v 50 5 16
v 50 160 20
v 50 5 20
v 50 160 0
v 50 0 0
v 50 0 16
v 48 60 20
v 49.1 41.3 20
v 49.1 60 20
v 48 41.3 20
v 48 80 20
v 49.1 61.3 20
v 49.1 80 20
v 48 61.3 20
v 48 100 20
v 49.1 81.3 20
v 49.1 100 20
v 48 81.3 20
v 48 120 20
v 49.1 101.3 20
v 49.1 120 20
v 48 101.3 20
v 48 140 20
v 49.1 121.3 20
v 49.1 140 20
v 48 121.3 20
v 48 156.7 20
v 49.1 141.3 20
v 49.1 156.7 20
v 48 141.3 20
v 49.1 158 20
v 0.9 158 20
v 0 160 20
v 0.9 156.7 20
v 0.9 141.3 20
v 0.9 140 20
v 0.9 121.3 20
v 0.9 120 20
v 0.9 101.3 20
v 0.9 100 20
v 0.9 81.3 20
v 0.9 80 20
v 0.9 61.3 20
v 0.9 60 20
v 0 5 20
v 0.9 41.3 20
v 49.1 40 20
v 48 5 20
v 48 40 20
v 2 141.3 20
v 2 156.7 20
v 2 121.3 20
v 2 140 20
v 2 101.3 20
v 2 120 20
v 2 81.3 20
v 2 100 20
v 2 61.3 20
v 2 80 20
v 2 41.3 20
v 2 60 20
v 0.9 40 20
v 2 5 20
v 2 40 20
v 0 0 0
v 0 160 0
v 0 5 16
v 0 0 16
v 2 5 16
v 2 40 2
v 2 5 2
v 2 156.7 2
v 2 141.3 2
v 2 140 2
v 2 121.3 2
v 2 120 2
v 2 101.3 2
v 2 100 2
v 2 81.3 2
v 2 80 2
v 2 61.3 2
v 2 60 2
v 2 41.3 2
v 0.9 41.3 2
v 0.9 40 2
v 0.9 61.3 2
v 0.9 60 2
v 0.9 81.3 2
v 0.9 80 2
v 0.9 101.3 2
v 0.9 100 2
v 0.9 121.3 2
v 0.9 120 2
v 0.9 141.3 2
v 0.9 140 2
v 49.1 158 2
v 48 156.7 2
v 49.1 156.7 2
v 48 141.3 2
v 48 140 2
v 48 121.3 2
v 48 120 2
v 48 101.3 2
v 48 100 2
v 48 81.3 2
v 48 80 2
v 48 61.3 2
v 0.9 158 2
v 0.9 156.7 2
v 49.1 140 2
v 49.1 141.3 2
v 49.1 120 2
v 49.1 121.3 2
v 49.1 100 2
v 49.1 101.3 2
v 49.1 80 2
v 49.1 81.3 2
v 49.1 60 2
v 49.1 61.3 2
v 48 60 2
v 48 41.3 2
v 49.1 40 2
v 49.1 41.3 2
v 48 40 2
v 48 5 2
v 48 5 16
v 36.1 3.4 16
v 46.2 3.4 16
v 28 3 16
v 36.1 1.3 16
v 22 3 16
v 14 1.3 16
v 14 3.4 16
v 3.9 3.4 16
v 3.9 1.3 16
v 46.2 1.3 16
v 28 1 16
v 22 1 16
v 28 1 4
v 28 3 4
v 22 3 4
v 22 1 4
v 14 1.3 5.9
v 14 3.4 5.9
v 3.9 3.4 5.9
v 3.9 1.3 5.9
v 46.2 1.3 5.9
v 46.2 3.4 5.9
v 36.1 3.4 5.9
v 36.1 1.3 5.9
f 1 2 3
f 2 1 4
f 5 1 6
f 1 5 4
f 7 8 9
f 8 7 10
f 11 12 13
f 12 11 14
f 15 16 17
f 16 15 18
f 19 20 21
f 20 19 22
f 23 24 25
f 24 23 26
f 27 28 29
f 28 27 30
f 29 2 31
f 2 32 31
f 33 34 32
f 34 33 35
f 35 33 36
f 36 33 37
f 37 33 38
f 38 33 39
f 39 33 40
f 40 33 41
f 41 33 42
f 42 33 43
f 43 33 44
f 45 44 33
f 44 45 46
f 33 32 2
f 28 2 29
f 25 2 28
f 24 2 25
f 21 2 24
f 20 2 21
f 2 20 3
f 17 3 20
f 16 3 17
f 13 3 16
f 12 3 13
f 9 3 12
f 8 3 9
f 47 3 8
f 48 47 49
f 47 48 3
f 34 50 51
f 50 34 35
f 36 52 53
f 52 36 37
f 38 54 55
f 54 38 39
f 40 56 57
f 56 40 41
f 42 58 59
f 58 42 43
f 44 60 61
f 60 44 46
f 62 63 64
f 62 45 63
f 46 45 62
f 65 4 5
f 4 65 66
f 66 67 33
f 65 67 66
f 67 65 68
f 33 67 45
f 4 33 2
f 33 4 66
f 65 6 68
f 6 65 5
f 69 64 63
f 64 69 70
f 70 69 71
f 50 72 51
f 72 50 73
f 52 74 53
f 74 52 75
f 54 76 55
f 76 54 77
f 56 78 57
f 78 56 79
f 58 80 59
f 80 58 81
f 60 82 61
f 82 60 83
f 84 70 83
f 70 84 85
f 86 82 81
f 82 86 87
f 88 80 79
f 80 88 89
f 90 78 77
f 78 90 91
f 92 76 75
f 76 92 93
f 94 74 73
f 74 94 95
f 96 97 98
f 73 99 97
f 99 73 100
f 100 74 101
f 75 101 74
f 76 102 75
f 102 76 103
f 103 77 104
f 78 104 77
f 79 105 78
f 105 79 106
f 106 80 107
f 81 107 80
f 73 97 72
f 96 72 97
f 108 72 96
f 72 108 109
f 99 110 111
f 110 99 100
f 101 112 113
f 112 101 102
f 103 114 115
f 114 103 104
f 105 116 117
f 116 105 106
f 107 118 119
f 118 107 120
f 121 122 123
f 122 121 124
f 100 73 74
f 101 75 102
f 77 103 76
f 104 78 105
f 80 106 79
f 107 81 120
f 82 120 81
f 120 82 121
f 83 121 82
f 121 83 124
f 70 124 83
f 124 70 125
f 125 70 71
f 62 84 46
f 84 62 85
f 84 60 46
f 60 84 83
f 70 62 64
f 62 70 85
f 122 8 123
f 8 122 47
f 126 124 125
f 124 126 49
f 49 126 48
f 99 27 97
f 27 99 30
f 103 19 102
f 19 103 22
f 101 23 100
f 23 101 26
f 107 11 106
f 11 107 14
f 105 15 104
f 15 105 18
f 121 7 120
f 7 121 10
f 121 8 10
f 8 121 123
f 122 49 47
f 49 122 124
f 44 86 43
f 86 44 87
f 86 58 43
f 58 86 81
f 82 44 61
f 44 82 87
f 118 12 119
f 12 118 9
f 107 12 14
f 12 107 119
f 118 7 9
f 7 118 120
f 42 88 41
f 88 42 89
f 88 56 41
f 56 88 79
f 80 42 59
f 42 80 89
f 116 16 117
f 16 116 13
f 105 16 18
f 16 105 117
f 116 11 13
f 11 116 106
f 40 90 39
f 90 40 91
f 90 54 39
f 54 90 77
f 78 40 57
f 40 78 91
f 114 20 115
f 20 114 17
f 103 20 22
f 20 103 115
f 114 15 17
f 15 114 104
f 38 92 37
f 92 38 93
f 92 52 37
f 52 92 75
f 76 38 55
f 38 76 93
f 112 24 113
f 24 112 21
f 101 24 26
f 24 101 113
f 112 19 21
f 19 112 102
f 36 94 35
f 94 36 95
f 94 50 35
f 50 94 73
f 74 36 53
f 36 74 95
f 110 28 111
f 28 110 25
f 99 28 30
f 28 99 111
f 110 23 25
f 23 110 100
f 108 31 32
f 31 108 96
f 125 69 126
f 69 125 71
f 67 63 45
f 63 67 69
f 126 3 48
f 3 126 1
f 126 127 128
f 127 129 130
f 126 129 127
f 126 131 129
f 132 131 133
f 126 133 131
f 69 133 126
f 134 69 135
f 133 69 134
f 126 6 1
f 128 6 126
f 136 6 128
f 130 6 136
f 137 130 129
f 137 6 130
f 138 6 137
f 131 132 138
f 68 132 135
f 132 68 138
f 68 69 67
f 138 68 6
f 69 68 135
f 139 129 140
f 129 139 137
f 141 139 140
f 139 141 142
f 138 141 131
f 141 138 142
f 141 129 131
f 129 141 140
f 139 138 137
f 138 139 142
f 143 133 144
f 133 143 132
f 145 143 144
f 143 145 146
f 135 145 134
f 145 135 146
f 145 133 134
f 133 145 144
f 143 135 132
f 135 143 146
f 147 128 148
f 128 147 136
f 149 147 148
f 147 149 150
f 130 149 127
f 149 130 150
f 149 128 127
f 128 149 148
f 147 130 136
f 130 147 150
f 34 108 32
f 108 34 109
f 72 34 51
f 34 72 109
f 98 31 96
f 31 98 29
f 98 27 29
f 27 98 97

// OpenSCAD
/*******************************************************/
// 1  = drawer
// 2  = base
// 3  = exterior front support
// 4  = exterior middle support
// 5  = exterior back support
// 6  = interior front support
// 7  = interior middle support
// 8  = interior back support
// 9  = drawer label
// 10 = side
// 11 = back 
// 12 = divider
// value from 1 to 12. Change to make all the necessary models for the storage system
MODEL_TO_MAKE = 1;

// exterior depth of drawer
DRAWER_DEPTH           = 160; 
// exterior width of drawer
DRAWER_WIDTH           = 50;   
// exterior height of drawer front including label
DRAWER_FRONT_HEIGHT    = 80;  
// exterior height of drawer sides and back
DRAWER_SIDES_HEIGHT    = 20;  
// thickness of sides, back, and bottom of drawer
DRAWER_THICKNESS       = 2;
// thickness of front of drawer. Needs room for label tabs and magnet. Best not to edit
DRAWER_FRONT_THICKNESS = 5;
// will always add one to back, then at the depths below
DIVIDER_SLOTS = [40,60,80,100, 120, 140];

// thickness of the dividers that can be placed in the drawer, will add tolerance when created
DIVIDER_THICKNESS = 1.2;
// Extra space for divider to slide into slots in drawer
DIVIDER_TOLERANCE = 0.1;
// distance divider slot will extend into sides of drawer, will add tolerance when created
DIVIDER_DEPTH = 1;
// height of the divider
DIVIDER_HEIGHT = 50;

// extra space for the label to slide into the tabs in the front of drawer
LABEL_TAB_EXTRA_SPACE  = 0.1;

// multiplied by DRAWER_FRONT_HEIGHT to determine height of label
LABEL_AS_PCT_OF_DRAWER = 0.8;
// height of the tab that will slide into the front of drawer
LABEL_TAB_HEIGHT       = 10;
// thickness of tab that will slide into front of drawer
LABEL_TAB_THICKNESS    = 2;
// width of the tab that will slide into front of drawer
LABEL_TAB_WIDTH        = 10;
// distance from the side of the label to the start of the tab
LABEL_TAB_SIDE_OFFSET  = 4;
//distance from the front of the label to the start of the tab
LABEL_TAB_FRONT_OFFSET = 1.4;

// total distance between drawer and supports to its sides
DRAWER_HORIZONTAL_TOLERANCE = 1;
// total distance between drawer and the bases above and below
DRAWER_VERTICAL_TOLERANCE   = 1;
// total distance between drawer and front of base below/above and supports behind
DRAWER_DEPTH_TOLERANCE      = 1;

// thickness of the bases
BASE_HEIGHT             = 5; 
// thickness of base interior. Support holes will not penetrate this interior section
BASE_INTERIOR_HEIGHT    = 1;
// Number of bases a drawer will span over its depth. Should be at least 2. 
BASES_PER_DRAWER        = 2;
// Save some filament by removing an interior rectangle from the base
BASE_REMOVAL_PERCENTAGE = .60;

// Thickness of side and back plates that slide between supports. These parts are solely aesthetic. Value must be less than 3.
SIDE_BACK_THICKNESS = 1.2;

//Provide a way to pull the drawer. Value of 0, 1, 2, 3: 3 = protrusion  2= centered hole for a knob, 1= slot for a magnet, 0=none
PULL_TYPE = 1;

// if PULL_TYPE == 1, make a slot to fit a magnet with this width or diameter
MAGNET_WIDTH  = 6;
// if PULL_TYPE == 1, make a slot to fit a magnet with this thickness
MAGNET_HEIGHT = 2;
// if PULL_TYPE == 1, make a slot that extends down to this distance from bottom of drawer
MAGNET_HEIGHT_OFFSET = 4;

// if PULL_TYPE == 2, make a hole of this diameter
KNOB_HOLE_DIAMETER = 8;
// if PULL_TYPE == 2, the height of center of knob hole from bottom of  drawer
KNOB_HOLE_HEIGHT = 12;
// if PULL_TYPE == 2, add a square inside the drawer of this size
KNOB_SQUARE_SIZE = 10;
// if PULL_TYPE == 2, add a square inside the drawer of this depth
KNOB_SQUARE_DEPTH = 1.2;

// if PULL_TYPE == 3, width of drawer base protrusion
PROTRUSION_WIDTH = 20;
// if PULL_TYPE == 3, height of drawer base protrusion
PROTRUSION_HEIGHT = 6;
// if PULL_TYPE == 3, depth of drawer base protrusion
PROTRUSION_DEPTH = 4;
// if PULL_TYPE == 3, percent of protrusion hollowed out
PROTRUSION_HOLLOW_PCT = 0.6;
 

// List of text to engrave on the drawer label. Each element in list is a list of 4 values:  [text, size of text, font, distance from bottom of label to font base]
TEXTS = [
         ["MLB", 12, "Arial", 40], 
         ["1986", 8, "Arial", 14]
        ];
// Depth to engrave the text into the label.
TEXT_DEPTH = 0.6;


/***************************************************************/

//do not edit
SUPPORT_DEPTH = 9.8;
// do not edit
SUPPORT_WIDTH = 6;


// The set 2D profile for all supports
module profile()
{
    square([1.5,SUPPORT_DEPTH]);
    translate([1.5,0,0]) 
        square([3, 5.8]);
    translate([4.5,0,0]) 
        square([1.5,SUPPORT_DEPTH]);
}

module support_exterior_front(height)
{
    translate([1,1,0]) 
        cube([4,4,height+4]);
    translate([0,0,2]) 
        linear_extrude(height)
            profile();
    
}

module support_exterior_middle(height)
{
    support_exterior_front(height);
    rotate(180) 
        translate([-SUPPORT_WIDTH,0,0]) 
            support_exterior_front(height);
}

module support_interior_middle(height)
{
    support_exterior_middle(height);
    translate([SUPPORT_WIDTH,0,0]) 
        support_exterior_middle(height);
}

module support_interior_front(height)
{
    support_exterior_front(height);
    translate([SUPPORT_WIDTH,0,0]) 
        support_exterior_front(height);
}

module support_exterior_back(height)
{
   support_exterior_front(height);
   rotate(90)
        translate([0,-SUPPORT_WIDTH,0])
            support_exterior_front(height);
}

module support_interior_back(height)
{
    support_exterior_back(height);
    rotate(270)
        translate([-SUPPORT_WIDTH,SUPPORT_WIDTH,0])
            support_exterior_back(height);
}

// Base is two halves with holes and an interior.
module base_half(width, depth, height)
{
    
    difference(){
        cube([width, depth, height]);
        translate([1,1,0])
            cube([2,2,height]);
        translate([width-3,1,0])
            cube([2,2,height]);
        translate([width-3,depth-3,0])
            cube([2,2,height]);
        translate([1,depth-3,0])
            cube([2,2,height]);
    }    
}

module base(width, depth)
{
    h = (BASE_HEIGHT - BASE_INTERIOR_HEIGHT) / 2;
    base_half(width, depth, h);
    difference()
    {
        union(){
            translate([0, 0, h])
                cube([width,depth,BASE_INTERIOR_HEIGHT]); 
            translate([0,0,BASE_INTERIOR_HEIGHT + h])
                base_half(width,depth, h );
            
        }
        // remove a section of base to save filament
        translate([(width - width*BASE_REMOVAL_PERCENTAGE)/2,
                   (depth - depth*BASE_REMOVAL_PERCENTAGE) / 2,
                   0 ])
           cube([width*BASE_REMOVAL_PERCENTAGE,
                depth*BASE_REMOVAL_PERCENTAGE,
                10]);
    }
}

module drawer(width, depth, height, side_height, thickness, front_thickness)
{
    magnet_x = (width - MAGNET_WIDTH) / 2;
    label_z = height - (height*LABEL_AS_PCT_OF_DRAWER);
    
    difference(){
        union(){
            
            cube([width, depth, side_height]);
            cube([width, front_thickness, label_z]);
            
            // protrusion
            if (PULL_TYPE == 3)
            {
                translate([(width - PROTRUSION_WIDTH)/2, -PROTRUSION_DEPTH, 0])
                    cube([PROTRUSION_WIDTH, PROTRUSION_DEPTH, PROTRUSION_HEIGHT]);
            }
        }
        // hollow it out
        translate([thickness, front_thickness, thickness])
            cube([width - (2 * thickness), 
                  depth - thickness - front_thickness, 
                  side_height]);
        // remove excess from where label will go
        translate([0, 0, label_z])
            cube([width, front_thickness, height]);
        // magnet slot
        if (PULL_TYPE == 1)
            translate([magnet_x, 1, MAGNET_HEIGHT_OFFSET ])
                cube([MAGNET_WIDTH, MAGNET_HEIGHT, label_z]);
        // knob hole
        if (PULL_TYPE == 2)
        {
            translate([width/2, 0, KNOB_HOLE_HEIGHT])
                rotate([270,0,0])
                    cylinder(h=front_thickness+1, d=KNOB_HOLE_DIAMETER);
            translate([width/2, front_thickness - KNOB_SQUARE_DEPTH/2, KNOB_HOLE_HEIGHT])
                rotate([0,45,0])
                      cube([KNOB_SQUARE_SIZE, KNOB_SQUARE_DEPTH, KNOB_SQUARE_SIZE], true);
        }
        // protrusion
        if (PULL_TYPE == 3)
        {
            translate([(width - PROTRUSION_WIDTH*PROTRUSION_HOLLOW_PCT)/2, 
                        -PROTRUSION_DEPTH*PROTRUSION_HOLLOW_PCT, 
                        PROTRUSION_HEIGHT -PROTRUSION_HEIGHT*PROTRUSION_HOLLOW_PCT])
                cube([PROTRUSION_WIDTH*PROTRUSION_HOLLOW_PCT, 
                      PROTRUSION_DEPTH*PROTRUSION_HOLLOW_PCT, 
                      PROTRUSION_HEIGHT*PROTRUSION_HOLLOW_PCT]);
        }
        // label tab left slot
        translate([(LABEL_TAB_SIDE_OFFSET - LABEL_TAB_EXTRA_SPACE), 
                   (LABEL_TAB_FRONT_OFFSET - LABEL_TAB_EXTRA_SPACE), 
                   label_z - LABEL_TAB_HEIGHT - LABEL_TAB_EXTRA_SPACE])
            cube([LABEL_TAB_WIDTH + LABEL_TAB_EXTRA_SPACE, 
                  LABEL_TAB_THICKNESS + LABEL_TAB_EXTRA_SPACE, 
                  height]);
        //label tab right slot
        translate([width - LABEL_TAB_SIDE_OFFSET - LABEL_TAB_WIDTH + LABEL_TAB_EXTRA_SPACE, 
                   LABEL_TAB_FRONT_OFFSET - LABEL_TAB_EXTRA_SPACE, 
                   label_z - LABEL_TAB_HEIGHT - LABEL_TAB_EXTRA_SPACE])
            cube([LABEL_TAB_WIDTH + LABEL_TAB_EXTRA_SPACE, 
                  LABEL_TAB_THICKNESS + LABEL_TAB_EXTRA_SPACE, 
                  height]);
        // back divider slot left
        translate([thickness - DIVIDER_DEPTH - DIVIDER_TOLERANCE,
                   depth - thickness - DIVIDER_THICKNESS - DIVIDER_TOLERANCE, 
                   thickness])
            cube([DIVIDER_DEPTH + DIVIDER_TOLERANCE, 
                  DIVIDER_THICKNESS + DIVIDER_TOLERANCE, 
                  side_height]);
        // back divider slot right
        translate([width - thickness,
                   depth-thickness - DIVIDER_THICKNESS - DIVIDER_TOLERANCE, 
                   thickness])
            cube([DIVIDER_DEPTH + DIVIDER_TOLERANCE, 
                  DIVIDER_THICKNESS + DIVIDER_TOLERANCE, 
                  side_height]);               
        // other divider slots
        for (d = DIVIDER_SLOTS)
        {
            // left side
            translate([thickness - DIVIDER_DEPTH - DIVIDER_TOLERANCE, d, thickness])
                cube([DIVIDER_DEPTH + DIVIDER_TOLERANCE, 
                     DIVIDER_THICKNESS + DIVIDER_TOLERANCE, 
                     side_height]);
            // right side
            translate([width - thickness, d, thickness])
                cube([DIVIDER_DEPTH + DIVIDER_TOLERANCE, 
                     DIVIDER_THICKNESS + DIVIDER_TOLERANCE, 
                     side_height]); 
            
        }
        
        
    }
}

module drawer_label(width, thickness, height)
{
    
    difference(){
        union(){
            cube([width, height, thickness]);
            translate([LABEL_TAB_SIDE_OFFSET, -LABEL_TAB_HEIGHT, 0 ])
                cube([LABEL_TAB_WIDTH, LABEL_TAB_HEIGHT, LABEL_TAB_THICKNESS ]);
            translate([width - LABEL_TAB_SIDE_OFFSET - LABEL_TAB_WIDTH, 
                       -LABEL_TAB_HEIGHT, 0])
            cube([LABEL_TAB_WIDTH, LABEL_TAB_HEIGHT, LABEL_TAB_THICKNESS ]);
        }
        for (t = TEXTS)
            translate([width/2, t[3], thickness-TEXT_DEPTH])
            linear_extrude(TEXT_DEPTH) 
                text(t[0], t[1], t[2], halign="center");
    }
        
}

module side(base_depth, height)
{
    y = base_depth - (SUPPORT_WIDTH * 2) - 1; // 1 = tolerance
    cube([SIDE_BACK_THICKNESS, y, height]);
}

module back(base_width, height)
{
    x = base_width - (SUPPORT_WIDTH * 2) - 1; // 1 = tolerance
    cube([x, SIDE_BACK_THICKNESS, height]);
}

module divider()
{
    width = DRAWER_WIDTH - (2*DRAWER_THICKNESS) + (2*DIVIDER_DEPTH);
    fillet = width/4; //radius of fillet
    union()
    {
        cube([width, DIVIDER_THICKNESS, DIVIDER_HEIGHT-fillet]);
        hull()
        {
            rotate(90, [1,0,0])
            {
                translate([fillet, DIVIDER_HEIGHT-fillet, -DIVIDER_THICKNESS])
                    cylinder(h=DIVIDER_THICKNESS, r=fillet);
                translate([width - fillet, DIVIDER_HEIGHT-fillet, -DIVIDER_THICKNESS])
                    cylinder(h=DIVIDER_THICKNESS, r=fillet);
            }
        }
    }
}

/**************************************************/
// BEGIN

base_depth = (DRAWER_DEPTH + SUPPORT_WIDTH + DRAWER_DEPTH_TOLERANCE) / BASES_PER_DRAWER;
base_width = DRAWER_WIDTH + DRAWER_HORIZONTAL_TOLERANCE + (SUPPORT_WIDTH * 2);

support_height = DRAWER_FRONT_HEIGHT + DRAWER_VERTICAL_TOLERANCE;

if (MODEL_TO_MAKE == 1)
{
    drawer(DRAWER_WIDTH, DRAWER_DEPTH, DRAWER_FRONT_HEIGHT,
        DRAWER_SIDES_HEIGHT, DRAWER_THICKNESS, DRAWER_FRONT_THICKNESS); 
}
else if (MODEL_TO_MAKE == 2)
{
    base(base_width, base_depth);
}
else if (MODEL_TO_MAKE == 3)
{
    support_exterior_front(support_height);
}
else if (MODEL_TO_MAKE == 4)
{
    support_exterior_middle(support_height);
}
else if (MODEL_TO_MAKE == 5)
{
    support_exterior_back(support_height);
}
else if (MODEL_TO_MAKE == 6)
{
    support_interior_front(support_height);
}
else if (MODEL_TO_MAKE == 7)
{
    support_interior_middle(support_height);
}
else if (MODEL_TO_MAKE == 8)
{
    support_interior_back(support_height);
}
else if (MODEL_TO_MAKE == 9)
{
    thickness = LABEL_TAB_FRONT_OFFSET + LABEL_TAB_THICKNESS;
    height = DRAWER_FRONT_HEIGHT * LABEL_AS_PCT_OF_DRAWER;
    drawer_label(DRAWER_WIDTH, thickness, height);
}
else if (MODEL_TO_MAKE == 10)
{
    side(base_depth, support_height);
}
else if (MODEL_TO_MAKE == 11)
{
    back(base_width, support_height);
}
else if (MODEL_TO_MAKE == 12)
{
    divider();
}
